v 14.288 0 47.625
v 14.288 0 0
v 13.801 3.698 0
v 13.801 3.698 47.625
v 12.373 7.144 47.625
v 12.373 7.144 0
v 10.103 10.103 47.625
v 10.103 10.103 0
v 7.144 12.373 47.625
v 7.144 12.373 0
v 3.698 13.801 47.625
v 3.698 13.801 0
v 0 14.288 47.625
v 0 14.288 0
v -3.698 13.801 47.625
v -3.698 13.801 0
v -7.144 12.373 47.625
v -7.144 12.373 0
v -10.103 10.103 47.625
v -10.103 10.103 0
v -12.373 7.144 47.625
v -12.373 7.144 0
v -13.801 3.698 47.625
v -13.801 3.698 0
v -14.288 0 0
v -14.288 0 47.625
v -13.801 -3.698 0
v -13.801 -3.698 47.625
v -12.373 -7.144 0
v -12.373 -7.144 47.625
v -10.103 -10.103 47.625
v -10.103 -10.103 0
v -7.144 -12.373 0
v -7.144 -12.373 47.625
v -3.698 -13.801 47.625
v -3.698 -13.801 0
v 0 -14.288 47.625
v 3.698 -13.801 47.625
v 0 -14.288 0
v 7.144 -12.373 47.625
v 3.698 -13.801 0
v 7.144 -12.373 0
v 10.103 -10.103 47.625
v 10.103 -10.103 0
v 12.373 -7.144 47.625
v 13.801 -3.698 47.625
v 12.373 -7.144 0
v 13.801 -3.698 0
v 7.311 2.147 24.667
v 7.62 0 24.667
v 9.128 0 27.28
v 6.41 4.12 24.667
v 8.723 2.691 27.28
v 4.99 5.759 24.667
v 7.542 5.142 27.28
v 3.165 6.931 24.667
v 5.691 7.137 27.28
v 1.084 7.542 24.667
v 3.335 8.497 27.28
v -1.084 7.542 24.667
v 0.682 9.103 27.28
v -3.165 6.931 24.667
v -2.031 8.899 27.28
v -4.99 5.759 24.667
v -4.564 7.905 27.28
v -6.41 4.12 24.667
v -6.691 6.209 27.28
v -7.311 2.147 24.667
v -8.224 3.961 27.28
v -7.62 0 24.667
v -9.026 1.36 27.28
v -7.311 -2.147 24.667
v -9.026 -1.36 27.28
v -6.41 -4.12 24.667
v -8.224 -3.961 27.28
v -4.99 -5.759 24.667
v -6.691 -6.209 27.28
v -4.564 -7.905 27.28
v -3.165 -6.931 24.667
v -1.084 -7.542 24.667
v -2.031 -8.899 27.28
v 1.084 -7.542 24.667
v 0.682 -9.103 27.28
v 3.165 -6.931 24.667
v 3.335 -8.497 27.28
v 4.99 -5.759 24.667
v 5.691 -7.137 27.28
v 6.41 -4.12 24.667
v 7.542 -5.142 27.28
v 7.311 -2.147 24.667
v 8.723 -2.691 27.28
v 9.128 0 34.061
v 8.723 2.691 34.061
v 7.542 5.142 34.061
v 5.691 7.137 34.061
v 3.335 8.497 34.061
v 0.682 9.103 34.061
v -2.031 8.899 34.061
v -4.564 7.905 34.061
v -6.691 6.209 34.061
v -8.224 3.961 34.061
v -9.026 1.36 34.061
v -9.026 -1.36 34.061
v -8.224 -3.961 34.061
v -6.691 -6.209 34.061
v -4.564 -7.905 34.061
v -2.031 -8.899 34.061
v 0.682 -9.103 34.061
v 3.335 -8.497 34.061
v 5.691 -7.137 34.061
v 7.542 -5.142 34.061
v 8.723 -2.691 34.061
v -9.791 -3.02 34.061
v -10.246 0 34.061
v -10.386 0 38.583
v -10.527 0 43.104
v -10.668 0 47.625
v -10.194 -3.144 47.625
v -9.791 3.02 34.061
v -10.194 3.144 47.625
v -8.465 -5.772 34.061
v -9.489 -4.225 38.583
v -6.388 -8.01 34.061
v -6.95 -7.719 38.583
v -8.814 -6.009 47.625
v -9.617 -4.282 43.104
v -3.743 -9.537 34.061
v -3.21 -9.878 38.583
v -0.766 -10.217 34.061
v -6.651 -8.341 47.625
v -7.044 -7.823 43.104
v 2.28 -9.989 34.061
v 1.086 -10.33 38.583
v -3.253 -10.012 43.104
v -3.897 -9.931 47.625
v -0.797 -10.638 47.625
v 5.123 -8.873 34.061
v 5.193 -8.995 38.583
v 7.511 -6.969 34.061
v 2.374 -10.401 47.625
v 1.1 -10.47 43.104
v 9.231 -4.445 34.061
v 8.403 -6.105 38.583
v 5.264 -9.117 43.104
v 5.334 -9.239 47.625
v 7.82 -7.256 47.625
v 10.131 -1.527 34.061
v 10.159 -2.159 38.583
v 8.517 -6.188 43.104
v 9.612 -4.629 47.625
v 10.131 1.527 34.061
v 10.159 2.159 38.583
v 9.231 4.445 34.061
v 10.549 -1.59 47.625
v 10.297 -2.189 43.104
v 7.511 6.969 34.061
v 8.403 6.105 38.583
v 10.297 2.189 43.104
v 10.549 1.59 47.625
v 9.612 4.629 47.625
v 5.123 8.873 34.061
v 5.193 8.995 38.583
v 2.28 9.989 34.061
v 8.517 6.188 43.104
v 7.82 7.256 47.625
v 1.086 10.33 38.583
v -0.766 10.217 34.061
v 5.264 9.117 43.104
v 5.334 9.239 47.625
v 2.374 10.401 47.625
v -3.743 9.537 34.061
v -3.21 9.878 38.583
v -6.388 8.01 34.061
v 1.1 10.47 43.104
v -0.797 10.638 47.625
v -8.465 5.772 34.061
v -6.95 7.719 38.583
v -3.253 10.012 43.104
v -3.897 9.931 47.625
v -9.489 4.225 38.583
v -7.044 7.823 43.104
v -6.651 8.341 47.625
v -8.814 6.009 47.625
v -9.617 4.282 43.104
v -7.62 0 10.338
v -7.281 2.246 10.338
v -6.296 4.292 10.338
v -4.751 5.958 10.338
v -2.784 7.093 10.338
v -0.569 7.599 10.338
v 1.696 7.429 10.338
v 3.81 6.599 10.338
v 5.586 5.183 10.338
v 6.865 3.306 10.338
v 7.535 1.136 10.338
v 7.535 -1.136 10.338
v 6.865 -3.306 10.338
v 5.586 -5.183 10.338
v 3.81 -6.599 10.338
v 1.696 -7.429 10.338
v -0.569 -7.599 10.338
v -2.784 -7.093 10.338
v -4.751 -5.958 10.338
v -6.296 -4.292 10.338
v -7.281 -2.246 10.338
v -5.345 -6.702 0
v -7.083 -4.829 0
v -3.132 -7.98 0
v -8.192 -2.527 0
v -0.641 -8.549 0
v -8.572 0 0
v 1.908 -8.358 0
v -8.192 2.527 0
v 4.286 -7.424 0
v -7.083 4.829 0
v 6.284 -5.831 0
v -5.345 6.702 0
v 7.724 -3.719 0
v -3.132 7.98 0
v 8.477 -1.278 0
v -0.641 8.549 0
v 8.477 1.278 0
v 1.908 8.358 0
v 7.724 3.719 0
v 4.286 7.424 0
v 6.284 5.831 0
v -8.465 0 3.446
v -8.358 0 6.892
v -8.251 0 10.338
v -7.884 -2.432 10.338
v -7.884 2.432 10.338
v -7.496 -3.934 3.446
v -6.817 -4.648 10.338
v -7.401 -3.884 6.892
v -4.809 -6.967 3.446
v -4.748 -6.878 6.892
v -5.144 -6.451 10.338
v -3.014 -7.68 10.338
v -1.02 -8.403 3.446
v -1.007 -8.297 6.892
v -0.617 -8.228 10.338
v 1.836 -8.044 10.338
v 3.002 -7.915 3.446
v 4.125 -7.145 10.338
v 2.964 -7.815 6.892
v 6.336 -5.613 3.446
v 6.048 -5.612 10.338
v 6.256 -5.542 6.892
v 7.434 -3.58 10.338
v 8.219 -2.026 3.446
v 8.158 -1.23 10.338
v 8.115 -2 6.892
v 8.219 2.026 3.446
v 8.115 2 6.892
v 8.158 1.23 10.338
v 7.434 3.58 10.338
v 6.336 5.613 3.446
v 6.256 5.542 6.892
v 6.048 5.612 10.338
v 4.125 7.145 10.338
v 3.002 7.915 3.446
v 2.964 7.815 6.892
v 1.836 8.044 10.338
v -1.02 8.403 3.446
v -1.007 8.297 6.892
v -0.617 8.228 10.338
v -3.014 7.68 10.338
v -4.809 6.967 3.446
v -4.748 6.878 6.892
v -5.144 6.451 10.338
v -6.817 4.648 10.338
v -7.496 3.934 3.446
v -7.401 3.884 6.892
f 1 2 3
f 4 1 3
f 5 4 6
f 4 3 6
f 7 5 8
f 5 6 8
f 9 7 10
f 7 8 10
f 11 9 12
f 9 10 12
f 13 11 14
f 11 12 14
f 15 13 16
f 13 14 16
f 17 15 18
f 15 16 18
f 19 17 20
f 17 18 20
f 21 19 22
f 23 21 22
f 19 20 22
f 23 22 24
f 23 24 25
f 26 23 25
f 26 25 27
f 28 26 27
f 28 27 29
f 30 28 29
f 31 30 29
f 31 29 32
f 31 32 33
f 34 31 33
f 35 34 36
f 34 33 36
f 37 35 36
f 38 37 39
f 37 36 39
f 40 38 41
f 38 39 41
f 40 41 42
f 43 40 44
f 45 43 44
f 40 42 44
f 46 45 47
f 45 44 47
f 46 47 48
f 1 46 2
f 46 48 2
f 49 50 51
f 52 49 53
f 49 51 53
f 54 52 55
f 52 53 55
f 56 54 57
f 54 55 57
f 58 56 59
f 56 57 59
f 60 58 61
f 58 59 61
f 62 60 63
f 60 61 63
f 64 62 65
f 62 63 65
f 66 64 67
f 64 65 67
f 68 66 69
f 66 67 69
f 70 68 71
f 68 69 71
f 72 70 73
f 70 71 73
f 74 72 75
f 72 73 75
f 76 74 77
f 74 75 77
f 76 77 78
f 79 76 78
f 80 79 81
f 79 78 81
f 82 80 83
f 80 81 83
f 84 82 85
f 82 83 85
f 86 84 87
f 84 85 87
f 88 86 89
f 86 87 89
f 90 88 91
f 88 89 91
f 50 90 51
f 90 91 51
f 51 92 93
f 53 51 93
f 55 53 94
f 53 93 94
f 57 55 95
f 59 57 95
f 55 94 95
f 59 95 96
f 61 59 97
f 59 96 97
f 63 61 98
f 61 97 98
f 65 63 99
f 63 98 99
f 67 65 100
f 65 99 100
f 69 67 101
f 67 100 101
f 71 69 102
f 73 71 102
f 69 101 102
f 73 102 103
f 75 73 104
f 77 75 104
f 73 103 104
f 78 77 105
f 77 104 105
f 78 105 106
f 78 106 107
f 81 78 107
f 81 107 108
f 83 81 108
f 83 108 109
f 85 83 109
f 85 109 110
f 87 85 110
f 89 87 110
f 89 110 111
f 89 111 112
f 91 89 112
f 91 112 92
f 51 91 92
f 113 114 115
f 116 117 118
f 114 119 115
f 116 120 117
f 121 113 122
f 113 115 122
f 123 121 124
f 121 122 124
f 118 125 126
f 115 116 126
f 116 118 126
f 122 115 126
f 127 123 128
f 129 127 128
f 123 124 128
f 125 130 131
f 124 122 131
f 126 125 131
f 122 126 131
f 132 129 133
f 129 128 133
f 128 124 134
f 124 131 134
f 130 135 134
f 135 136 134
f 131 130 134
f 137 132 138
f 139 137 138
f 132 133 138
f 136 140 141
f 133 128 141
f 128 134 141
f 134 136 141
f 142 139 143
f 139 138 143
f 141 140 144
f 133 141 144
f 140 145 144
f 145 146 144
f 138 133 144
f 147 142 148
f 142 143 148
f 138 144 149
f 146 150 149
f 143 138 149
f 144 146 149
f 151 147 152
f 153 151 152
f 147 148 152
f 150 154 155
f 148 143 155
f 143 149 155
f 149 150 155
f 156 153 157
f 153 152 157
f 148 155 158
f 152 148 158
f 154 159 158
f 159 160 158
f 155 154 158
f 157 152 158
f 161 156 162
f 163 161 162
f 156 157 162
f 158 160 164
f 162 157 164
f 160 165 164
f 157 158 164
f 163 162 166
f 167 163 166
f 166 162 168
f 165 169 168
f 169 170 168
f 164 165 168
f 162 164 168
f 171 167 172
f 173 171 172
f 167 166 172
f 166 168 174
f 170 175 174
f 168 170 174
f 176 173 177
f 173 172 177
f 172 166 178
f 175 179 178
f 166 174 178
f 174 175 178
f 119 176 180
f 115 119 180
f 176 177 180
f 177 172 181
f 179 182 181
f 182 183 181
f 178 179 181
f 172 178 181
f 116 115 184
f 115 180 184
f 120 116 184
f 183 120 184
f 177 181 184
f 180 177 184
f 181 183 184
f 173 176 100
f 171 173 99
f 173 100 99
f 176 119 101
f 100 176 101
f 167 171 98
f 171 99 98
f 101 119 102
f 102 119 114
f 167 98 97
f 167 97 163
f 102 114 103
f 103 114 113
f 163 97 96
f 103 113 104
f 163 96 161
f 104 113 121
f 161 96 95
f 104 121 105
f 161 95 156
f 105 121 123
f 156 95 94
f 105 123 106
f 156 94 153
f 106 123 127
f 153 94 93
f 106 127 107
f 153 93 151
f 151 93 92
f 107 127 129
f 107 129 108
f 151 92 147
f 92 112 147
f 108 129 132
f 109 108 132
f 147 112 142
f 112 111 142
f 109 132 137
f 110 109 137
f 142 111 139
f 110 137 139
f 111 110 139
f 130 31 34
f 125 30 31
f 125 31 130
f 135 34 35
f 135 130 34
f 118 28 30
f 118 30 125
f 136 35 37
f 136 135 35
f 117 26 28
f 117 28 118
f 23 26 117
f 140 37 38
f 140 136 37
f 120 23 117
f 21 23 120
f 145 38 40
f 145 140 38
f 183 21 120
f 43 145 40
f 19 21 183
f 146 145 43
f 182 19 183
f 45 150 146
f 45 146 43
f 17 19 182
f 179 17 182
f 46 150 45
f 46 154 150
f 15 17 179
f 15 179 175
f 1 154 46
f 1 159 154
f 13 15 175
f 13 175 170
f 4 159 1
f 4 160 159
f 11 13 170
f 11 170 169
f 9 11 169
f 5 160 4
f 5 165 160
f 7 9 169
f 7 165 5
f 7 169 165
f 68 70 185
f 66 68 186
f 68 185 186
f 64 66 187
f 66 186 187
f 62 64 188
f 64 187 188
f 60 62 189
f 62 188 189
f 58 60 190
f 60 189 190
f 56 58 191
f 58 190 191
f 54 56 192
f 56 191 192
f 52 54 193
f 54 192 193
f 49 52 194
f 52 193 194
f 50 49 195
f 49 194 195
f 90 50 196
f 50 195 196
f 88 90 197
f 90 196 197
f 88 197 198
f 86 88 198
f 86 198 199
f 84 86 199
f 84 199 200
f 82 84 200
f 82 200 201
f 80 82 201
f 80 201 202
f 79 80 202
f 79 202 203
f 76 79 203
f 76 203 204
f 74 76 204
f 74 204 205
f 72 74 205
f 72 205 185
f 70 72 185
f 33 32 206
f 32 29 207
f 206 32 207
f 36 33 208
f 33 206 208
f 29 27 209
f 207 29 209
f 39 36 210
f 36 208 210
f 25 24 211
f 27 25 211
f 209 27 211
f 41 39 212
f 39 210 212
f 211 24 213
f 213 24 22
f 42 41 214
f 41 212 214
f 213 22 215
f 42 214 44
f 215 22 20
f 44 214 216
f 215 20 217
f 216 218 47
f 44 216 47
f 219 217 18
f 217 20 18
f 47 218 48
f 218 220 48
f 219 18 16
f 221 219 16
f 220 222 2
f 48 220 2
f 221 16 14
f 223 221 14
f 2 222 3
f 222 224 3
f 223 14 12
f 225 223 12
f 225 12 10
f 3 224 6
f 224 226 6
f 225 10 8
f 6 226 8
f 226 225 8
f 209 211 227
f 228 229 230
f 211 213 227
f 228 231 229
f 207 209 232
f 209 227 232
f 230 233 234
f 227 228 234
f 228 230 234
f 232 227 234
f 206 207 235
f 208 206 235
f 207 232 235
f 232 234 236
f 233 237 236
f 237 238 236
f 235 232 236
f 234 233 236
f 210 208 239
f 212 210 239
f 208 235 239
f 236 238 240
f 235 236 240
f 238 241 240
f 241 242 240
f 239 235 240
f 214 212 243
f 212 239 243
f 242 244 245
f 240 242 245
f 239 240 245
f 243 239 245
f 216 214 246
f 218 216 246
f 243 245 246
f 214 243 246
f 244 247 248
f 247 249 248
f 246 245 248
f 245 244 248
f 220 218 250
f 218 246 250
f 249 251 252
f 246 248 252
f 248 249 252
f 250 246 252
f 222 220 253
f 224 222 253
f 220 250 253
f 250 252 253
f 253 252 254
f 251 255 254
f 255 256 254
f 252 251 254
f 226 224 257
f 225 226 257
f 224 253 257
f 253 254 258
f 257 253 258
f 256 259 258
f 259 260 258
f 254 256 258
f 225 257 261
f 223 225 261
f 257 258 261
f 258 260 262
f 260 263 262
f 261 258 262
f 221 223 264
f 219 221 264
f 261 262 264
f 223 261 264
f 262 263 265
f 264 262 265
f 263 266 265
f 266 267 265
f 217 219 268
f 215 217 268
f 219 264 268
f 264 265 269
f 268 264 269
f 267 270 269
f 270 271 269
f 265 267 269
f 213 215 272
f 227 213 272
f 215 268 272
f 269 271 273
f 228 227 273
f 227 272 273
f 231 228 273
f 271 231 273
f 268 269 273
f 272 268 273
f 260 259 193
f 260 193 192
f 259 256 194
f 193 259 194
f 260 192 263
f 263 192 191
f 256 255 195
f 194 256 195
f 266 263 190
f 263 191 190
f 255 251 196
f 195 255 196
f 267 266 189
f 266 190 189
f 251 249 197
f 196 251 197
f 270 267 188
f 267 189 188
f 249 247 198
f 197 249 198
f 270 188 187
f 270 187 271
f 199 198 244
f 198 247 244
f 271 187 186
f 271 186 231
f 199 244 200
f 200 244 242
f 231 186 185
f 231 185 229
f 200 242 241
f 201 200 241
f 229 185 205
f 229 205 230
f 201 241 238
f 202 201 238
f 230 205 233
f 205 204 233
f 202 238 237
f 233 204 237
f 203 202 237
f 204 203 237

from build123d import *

# Parameters (mm, degrees)
BODYSCH_R       = 14.2875
BODY_DEPTH      = 47.625
FLOWSCH_R       = 9.128125
FLOW_DEPTH      = 20.3454
FLOWSMALLSCH_R  = 7.62
FLOWSMALL_DEPTH = 43.409911534


# Read off the part's stored shape, not the designer's step: Flow30deg
with BuildPart() as part:
    # BodySch → Body (new body)
    with BuildSketch(Plane.XY):
        Circle(BODYSCH_R)
    extrude(amount=BODY_DEPTH)

    # FlowSch → Flow (cut)
    with BuildSketch(Plane.XY.offset(47.625)):
        Circle(FLOWSCH_R)
    extrude(amount=-FLOW_DEPTH, mode=Mode.SUBTRACT)

    # ThreadSch → Thread (revolve, cut)
    with BuildSketch(Plane(origin=(0, 0, 0), x_dir=(0, 0, -1), z_dir=(1, 0, 0)), mode=Mode.PRIVATE) as thread_sk:
        Polygon((-34.0614, 0), (-34.0614, 10.24569605), (-47.625, 10.668), (-47.625, 0), align=None)
    revolve(thread_sk.sketch.rotate(Axis((0, 0, 0), (0, 0, 1)), 90), axis=Axis((0, 0, 0), (0, 0, 1)), mode=Mode.SUBTRACT)

    # ThreadSmallSke → ThreadSmall (revolve, cut)
    with BuildSketch(Plane(origin=(0, 0, 0), x_dir=(0, 0, -1), z_dir=(1, 0, 0)), mode=Mode.PRIVATE) as threadsmall_sk:
        Polygon((0, 0), (0, 8.5725), (-10.3378, 8.250631633), (-10.3378, 0), (-0.549620086, 0), align=None)
    revolve(threadsmall_sk.sketch.rotate(Axis((0, 0, 0), (0, 0, 1)), 90), axis=Axis((0, 0, 0), (0, 0, 1)), mode=Mode.SUBTRACT)

    # Flow30deg outline → Flow30deg (revolve, cut)
    with BuildSketch(Plane.XZ):
        Polygon((0, 27.2796), (0, 11.469223722), (9.128125, 27.2796), align=None)
    revolve(axis=Axis((0, 0, 0), (0, 0, 1)), mode=Mode.SUBTRACT)

    # FlowSmallSch → FlowSmall (cut, through all)
    with BuildSketch(Plane(origin=(0, 0, 10.3378), x_dir=(-1, 0, 0), z_dir=(0, 0, -1))):
        Circle(FLOWSMALLSCH_R)
    extrude(amount=-FLOWSMALL_DEPTH, mode=Mode.SUBTRACT)


solid = part.part
